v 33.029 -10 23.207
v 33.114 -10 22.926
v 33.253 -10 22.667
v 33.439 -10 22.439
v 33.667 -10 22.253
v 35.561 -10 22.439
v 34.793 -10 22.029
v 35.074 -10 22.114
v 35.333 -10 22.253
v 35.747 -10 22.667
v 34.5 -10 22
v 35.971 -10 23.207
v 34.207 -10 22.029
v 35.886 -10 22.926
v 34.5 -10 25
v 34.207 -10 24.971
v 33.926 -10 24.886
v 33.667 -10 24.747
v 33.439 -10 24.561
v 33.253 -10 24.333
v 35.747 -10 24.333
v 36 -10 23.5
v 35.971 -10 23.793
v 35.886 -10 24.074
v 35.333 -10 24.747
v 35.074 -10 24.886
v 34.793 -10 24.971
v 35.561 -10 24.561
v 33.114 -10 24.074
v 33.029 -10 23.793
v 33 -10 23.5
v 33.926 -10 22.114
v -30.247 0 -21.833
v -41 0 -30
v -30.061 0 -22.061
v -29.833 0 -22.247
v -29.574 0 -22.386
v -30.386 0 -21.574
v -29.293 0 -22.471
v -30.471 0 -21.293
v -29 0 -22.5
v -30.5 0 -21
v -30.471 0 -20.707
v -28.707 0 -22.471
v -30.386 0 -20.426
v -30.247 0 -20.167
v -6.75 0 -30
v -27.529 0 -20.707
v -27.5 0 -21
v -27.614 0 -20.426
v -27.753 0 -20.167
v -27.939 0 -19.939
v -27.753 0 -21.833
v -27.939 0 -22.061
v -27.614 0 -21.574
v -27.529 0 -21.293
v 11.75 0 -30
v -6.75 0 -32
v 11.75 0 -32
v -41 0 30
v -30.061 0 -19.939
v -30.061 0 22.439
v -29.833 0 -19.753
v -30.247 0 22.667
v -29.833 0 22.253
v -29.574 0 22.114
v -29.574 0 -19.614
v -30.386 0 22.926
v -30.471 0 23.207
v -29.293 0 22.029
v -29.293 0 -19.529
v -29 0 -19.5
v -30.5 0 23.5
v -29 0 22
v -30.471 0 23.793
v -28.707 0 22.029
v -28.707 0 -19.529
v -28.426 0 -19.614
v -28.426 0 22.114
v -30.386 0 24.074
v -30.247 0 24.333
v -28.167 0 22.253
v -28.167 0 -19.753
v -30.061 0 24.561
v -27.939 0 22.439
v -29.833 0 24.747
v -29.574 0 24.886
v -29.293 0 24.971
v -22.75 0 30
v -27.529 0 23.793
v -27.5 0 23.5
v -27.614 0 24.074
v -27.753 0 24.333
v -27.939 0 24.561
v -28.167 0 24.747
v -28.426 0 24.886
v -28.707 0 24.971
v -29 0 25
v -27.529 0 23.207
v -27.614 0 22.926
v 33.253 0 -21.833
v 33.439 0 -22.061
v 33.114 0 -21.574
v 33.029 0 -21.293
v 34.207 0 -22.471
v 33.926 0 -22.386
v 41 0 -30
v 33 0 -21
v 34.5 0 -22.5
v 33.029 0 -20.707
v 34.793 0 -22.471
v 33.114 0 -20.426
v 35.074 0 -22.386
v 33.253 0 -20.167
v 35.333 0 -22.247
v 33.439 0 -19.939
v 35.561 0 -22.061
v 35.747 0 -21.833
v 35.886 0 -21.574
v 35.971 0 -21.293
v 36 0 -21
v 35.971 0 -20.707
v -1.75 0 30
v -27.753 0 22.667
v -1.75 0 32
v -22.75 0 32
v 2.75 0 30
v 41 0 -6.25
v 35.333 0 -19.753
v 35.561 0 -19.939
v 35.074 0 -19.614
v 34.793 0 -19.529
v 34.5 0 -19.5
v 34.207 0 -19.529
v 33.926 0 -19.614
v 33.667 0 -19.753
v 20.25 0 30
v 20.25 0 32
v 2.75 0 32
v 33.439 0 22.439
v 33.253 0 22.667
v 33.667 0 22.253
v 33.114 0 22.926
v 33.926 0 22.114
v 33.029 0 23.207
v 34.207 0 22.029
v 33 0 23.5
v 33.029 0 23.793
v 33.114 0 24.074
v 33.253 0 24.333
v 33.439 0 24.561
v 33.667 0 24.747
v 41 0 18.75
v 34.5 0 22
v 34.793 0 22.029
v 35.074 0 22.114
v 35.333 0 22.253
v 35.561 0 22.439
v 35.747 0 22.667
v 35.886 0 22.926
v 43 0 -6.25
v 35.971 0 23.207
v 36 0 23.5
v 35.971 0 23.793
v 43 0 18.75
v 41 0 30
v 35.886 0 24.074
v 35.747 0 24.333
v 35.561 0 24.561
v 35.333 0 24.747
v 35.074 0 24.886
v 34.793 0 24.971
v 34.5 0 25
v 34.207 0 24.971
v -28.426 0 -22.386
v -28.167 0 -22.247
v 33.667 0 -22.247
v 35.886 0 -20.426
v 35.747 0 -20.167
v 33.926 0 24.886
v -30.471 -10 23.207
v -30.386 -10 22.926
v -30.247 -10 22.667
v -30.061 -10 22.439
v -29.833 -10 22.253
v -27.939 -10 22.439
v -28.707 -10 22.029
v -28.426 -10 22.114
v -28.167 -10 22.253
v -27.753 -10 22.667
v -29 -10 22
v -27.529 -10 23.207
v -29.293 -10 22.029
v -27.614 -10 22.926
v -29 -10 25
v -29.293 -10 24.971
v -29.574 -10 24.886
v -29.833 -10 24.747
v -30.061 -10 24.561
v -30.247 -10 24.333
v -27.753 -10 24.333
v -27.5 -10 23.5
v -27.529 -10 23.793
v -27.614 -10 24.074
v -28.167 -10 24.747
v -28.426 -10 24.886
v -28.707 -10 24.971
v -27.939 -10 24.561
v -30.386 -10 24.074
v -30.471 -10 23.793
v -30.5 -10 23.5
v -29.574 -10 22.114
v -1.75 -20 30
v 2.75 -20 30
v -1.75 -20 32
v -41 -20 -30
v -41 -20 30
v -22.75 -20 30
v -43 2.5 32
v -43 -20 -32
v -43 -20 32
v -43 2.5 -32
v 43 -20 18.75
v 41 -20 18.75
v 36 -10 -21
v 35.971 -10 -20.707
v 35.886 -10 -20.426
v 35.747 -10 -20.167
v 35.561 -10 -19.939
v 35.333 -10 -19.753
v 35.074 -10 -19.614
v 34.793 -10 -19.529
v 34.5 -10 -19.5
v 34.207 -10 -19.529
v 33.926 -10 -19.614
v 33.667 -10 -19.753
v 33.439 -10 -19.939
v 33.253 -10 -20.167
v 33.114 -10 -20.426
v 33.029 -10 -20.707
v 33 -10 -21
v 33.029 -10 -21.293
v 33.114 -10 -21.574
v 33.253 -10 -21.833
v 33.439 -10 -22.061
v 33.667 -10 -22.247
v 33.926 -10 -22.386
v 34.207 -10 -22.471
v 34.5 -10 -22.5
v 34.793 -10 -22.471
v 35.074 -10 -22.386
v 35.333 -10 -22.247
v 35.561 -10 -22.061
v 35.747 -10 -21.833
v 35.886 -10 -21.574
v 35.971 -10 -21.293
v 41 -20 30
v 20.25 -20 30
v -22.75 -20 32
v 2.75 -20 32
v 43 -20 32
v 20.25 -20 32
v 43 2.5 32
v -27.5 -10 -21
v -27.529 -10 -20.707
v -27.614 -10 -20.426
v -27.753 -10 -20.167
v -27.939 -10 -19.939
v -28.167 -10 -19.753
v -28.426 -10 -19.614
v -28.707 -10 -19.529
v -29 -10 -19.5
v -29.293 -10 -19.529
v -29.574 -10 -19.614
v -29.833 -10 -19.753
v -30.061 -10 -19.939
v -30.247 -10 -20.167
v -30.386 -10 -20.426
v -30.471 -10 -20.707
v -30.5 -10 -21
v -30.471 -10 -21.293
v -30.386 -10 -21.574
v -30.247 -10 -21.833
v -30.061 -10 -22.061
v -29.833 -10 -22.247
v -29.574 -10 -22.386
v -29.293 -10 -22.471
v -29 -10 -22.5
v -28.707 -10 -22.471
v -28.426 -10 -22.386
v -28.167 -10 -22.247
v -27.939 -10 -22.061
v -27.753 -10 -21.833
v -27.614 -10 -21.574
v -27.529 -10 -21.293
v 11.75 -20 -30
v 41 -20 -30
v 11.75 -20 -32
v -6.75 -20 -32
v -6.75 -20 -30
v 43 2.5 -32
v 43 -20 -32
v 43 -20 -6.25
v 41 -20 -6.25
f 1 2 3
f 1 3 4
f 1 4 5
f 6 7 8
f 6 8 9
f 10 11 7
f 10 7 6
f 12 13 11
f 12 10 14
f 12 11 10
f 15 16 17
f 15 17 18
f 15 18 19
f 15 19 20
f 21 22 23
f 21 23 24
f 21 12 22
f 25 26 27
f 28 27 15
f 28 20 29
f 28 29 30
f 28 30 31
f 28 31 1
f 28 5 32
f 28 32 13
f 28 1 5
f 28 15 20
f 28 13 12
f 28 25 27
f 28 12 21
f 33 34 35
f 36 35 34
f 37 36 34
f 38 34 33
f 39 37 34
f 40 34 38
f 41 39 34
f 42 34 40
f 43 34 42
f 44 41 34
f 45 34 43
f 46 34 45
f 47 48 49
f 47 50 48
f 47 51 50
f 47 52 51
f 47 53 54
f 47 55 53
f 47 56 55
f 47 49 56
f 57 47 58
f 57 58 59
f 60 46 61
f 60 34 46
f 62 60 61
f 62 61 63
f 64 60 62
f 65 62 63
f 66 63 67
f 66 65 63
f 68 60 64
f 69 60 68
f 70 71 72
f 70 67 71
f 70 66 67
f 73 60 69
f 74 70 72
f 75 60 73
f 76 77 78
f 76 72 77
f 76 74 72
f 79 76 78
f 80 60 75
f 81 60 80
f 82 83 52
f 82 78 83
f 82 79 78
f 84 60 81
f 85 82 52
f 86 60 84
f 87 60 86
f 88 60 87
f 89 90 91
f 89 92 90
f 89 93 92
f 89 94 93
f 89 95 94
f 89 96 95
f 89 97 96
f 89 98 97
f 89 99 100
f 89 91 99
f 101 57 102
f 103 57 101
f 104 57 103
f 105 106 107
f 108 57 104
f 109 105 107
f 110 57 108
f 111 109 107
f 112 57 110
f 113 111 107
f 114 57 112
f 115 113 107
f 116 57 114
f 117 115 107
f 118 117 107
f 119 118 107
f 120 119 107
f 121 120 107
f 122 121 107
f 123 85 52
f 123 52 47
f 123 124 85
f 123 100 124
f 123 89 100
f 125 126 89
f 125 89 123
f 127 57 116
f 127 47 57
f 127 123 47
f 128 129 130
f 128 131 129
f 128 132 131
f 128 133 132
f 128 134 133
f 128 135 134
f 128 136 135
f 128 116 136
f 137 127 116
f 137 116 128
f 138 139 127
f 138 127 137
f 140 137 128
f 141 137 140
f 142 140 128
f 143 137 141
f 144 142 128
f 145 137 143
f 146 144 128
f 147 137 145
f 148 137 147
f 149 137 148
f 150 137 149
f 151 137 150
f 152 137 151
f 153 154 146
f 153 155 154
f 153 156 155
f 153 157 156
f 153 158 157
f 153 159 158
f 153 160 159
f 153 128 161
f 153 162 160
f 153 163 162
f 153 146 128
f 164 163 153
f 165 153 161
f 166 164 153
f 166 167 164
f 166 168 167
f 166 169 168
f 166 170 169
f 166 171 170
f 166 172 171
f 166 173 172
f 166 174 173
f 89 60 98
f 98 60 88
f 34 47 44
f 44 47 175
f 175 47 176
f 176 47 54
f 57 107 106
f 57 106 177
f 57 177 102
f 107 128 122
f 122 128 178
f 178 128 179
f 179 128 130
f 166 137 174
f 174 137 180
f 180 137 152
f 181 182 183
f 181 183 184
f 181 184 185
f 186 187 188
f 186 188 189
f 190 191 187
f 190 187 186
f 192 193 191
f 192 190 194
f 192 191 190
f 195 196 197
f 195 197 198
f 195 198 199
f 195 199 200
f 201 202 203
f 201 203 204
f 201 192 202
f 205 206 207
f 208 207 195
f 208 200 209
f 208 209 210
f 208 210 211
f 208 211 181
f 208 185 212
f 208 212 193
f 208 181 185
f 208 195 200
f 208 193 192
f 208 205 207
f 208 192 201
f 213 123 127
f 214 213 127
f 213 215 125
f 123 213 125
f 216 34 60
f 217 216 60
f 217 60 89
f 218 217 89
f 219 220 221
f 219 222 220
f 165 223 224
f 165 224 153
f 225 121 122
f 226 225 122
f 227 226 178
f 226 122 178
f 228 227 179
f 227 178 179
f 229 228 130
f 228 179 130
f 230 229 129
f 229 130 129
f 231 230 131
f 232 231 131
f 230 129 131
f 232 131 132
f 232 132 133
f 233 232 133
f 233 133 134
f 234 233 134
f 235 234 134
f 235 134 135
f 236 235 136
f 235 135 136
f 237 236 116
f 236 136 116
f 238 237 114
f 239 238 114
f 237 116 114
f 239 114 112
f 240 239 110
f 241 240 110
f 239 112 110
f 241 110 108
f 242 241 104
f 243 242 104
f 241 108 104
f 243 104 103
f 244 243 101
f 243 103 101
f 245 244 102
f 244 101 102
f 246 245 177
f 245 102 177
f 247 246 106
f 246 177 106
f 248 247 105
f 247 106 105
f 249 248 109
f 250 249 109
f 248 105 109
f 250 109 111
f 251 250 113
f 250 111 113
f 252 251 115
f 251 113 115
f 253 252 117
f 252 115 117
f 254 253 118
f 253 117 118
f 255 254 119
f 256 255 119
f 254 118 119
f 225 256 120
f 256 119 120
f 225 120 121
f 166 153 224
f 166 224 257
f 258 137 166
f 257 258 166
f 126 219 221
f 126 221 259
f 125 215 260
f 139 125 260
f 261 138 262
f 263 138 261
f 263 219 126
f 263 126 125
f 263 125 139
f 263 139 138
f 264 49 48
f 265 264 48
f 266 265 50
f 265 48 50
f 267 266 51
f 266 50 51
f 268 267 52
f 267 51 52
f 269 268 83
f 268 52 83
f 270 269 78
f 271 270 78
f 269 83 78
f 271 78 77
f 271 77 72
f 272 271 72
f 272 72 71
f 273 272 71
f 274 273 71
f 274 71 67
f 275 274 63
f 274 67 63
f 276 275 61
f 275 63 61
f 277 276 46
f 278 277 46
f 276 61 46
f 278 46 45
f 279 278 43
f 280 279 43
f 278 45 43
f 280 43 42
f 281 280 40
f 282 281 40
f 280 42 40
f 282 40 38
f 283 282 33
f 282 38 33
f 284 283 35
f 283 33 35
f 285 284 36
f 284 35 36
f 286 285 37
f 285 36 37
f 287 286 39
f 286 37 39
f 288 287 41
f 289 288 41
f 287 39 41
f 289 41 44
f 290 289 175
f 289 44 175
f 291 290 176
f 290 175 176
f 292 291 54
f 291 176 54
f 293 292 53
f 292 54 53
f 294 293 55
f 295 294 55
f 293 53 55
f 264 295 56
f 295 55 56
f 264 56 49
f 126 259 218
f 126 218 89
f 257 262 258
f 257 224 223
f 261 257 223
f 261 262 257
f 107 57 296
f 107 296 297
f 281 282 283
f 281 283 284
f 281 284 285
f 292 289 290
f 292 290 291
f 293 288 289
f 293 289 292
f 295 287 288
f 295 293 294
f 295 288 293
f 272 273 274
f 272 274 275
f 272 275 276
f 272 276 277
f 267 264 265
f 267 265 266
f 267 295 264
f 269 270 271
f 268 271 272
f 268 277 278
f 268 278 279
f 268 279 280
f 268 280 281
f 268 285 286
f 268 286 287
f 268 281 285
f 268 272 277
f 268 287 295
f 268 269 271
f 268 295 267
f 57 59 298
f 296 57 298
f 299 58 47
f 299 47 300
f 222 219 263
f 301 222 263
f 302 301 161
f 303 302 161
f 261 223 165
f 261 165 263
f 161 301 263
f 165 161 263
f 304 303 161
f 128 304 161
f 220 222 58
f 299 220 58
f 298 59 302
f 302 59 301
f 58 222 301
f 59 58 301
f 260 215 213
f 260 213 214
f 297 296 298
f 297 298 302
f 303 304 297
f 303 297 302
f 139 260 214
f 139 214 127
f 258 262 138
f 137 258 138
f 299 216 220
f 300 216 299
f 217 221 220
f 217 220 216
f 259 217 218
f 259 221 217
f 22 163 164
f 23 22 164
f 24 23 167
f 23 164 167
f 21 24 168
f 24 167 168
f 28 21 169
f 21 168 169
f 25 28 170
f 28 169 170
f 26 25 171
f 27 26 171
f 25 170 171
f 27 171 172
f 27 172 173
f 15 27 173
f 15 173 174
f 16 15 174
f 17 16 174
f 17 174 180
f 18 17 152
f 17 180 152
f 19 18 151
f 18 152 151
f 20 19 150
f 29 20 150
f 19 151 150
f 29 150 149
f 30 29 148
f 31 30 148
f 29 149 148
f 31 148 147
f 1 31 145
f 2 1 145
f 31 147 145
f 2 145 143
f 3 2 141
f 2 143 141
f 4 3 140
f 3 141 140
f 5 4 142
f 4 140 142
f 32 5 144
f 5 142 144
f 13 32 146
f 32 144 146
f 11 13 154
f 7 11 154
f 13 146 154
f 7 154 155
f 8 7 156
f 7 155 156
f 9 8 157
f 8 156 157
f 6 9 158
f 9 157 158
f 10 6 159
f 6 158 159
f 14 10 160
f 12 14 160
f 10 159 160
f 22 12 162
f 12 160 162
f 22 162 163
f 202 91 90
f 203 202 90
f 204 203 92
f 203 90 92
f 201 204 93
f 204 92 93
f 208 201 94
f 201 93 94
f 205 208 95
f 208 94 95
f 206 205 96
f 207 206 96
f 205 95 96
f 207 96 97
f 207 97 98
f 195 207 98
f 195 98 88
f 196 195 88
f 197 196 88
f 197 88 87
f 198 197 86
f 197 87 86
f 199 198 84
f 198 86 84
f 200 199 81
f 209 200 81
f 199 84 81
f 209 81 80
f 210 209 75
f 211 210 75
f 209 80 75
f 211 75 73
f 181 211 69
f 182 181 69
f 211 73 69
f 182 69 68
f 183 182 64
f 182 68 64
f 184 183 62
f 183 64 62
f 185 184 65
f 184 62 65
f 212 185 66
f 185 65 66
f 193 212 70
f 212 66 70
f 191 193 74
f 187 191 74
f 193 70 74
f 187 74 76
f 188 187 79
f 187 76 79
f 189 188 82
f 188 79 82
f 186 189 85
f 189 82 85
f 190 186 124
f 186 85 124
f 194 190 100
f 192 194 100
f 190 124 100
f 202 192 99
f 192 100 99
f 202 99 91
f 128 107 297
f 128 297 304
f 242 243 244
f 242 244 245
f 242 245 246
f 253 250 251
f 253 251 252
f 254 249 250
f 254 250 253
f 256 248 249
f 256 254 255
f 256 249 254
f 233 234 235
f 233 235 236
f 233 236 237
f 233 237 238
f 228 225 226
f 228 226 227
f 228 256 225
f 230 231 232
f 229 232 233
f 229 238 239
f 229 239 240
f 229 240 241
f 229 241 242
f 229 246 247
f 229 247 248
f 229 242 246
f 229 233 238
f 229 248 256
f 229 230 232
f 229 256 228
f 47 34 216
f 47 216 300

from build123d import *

# Parameters (mm, degrees)
F0_W     = 86
F0_H     = 64
F0_W_2   = 82
F0_H_2   = 60
F0_R     = 1.5
F1_DEPTH = 2.5
F2_DEPTH = 10
F3_DEPTH = 20
F4_W     = 20
F4_H     = 25
F5_DEPTH = 2
F6_W     = 18.5
F6_H     = 20
F7_DEPTH = 2
F8_W     = 21
F8_H     = 20
F8_W_2   = 17.5
F9_DEPTH = 2


with BuildPart() as f1:
    # F0 (on Front) → F1 (new body)
    with BuildSketch(Plane.XZ):
        Rectangle(F0_W, F0_H)
        Rectangle(F0_W_2, F0_H_2, mode=Mode.SUBTRACT)
        Rectangle(F0_W_2, F0_H_2)
        with Locations((-29, -21)):
            Circle(F0_R, mode=Mode.SUBTRACT)
        with Locations((34.5, -21)):
            Circle(F0_R, mode=Mode.SUBTRACT)
        with Locations((-29, 23.5)):
            Circle(F0_R, mode=Mode.SUBTRACT)
        with Locations((34.5, 23.5)):
            Circle(F0_R, mode=Mode.SUBTRACT)
        with Locations((-29, 23.5)):
            Circle(F0_R)
        with Locations((-29, -21)):
            Circle(F0_R)
        with Locations((34.5, -21)):
            Circle(F0_R)
        with Locations((34.5, 23.5)):
            Circle(F0_R)
    extrude(amount=-F1_DEPTH)

    # F0 (on Front) → F2 (join)
    with BuildSketch(Plane.XZ):
        with Locations((-29, 23.5)):
            Circle(F0_R)
        with Locations((-29, -21)):
            Circle(F0_R)
        with Locations((34.5, -21)):
            Circle(F0_R)
        with Locations((34.5, 23.5)):
            Circle(F0_R)
    extrude(amount=F2_DEPTH)

    # F0 (on Front) → F3 (join)
    with BuildSketch(Plane.XZ):
        Rectangle(F0_W, F0_H)
        Rectangle(F0_W_2, F0_H_2, mode=Mode.SUBTRACT)
    extrude(amount=F3_DEPTH)

    # F4 (on face) → F5 (cut)
    with BuildSketch(Plane.YZ.offset(43)):
        with Locations((-10, 6.25)):
            Rectangle(F4_W, F4_H)
    extrude(amount=-F5_DEPTH, mode=Mode.SUBTRACT)

    # F6 (on face) → F7 (cut)
    with BuildSketch(Plane(origin=(0, 0, -32), x_dir=(1, 0, 0), z_dir=(0, 0, -1))):
        with Locations((2.5, 10)):
            Rectangle(F6_W, F6_H)
    extrude(amount=-F7_DEPTH, mode=Mode.SUBTRACT)

    # F8 (on face) → F9 (cut)
    with BuildSketch(Plane.XY.offset(32)):
        with Locations((-12.25, -10)):
            Rectangle(F8_W, F8_H)
        with Locations((11.5, -10)):
            Rectangle(F8_W_2, F8_H)
    extrude(amount=-F9_DEPTH, mode=Mode.SUBTRACT)


solid = f1.part
